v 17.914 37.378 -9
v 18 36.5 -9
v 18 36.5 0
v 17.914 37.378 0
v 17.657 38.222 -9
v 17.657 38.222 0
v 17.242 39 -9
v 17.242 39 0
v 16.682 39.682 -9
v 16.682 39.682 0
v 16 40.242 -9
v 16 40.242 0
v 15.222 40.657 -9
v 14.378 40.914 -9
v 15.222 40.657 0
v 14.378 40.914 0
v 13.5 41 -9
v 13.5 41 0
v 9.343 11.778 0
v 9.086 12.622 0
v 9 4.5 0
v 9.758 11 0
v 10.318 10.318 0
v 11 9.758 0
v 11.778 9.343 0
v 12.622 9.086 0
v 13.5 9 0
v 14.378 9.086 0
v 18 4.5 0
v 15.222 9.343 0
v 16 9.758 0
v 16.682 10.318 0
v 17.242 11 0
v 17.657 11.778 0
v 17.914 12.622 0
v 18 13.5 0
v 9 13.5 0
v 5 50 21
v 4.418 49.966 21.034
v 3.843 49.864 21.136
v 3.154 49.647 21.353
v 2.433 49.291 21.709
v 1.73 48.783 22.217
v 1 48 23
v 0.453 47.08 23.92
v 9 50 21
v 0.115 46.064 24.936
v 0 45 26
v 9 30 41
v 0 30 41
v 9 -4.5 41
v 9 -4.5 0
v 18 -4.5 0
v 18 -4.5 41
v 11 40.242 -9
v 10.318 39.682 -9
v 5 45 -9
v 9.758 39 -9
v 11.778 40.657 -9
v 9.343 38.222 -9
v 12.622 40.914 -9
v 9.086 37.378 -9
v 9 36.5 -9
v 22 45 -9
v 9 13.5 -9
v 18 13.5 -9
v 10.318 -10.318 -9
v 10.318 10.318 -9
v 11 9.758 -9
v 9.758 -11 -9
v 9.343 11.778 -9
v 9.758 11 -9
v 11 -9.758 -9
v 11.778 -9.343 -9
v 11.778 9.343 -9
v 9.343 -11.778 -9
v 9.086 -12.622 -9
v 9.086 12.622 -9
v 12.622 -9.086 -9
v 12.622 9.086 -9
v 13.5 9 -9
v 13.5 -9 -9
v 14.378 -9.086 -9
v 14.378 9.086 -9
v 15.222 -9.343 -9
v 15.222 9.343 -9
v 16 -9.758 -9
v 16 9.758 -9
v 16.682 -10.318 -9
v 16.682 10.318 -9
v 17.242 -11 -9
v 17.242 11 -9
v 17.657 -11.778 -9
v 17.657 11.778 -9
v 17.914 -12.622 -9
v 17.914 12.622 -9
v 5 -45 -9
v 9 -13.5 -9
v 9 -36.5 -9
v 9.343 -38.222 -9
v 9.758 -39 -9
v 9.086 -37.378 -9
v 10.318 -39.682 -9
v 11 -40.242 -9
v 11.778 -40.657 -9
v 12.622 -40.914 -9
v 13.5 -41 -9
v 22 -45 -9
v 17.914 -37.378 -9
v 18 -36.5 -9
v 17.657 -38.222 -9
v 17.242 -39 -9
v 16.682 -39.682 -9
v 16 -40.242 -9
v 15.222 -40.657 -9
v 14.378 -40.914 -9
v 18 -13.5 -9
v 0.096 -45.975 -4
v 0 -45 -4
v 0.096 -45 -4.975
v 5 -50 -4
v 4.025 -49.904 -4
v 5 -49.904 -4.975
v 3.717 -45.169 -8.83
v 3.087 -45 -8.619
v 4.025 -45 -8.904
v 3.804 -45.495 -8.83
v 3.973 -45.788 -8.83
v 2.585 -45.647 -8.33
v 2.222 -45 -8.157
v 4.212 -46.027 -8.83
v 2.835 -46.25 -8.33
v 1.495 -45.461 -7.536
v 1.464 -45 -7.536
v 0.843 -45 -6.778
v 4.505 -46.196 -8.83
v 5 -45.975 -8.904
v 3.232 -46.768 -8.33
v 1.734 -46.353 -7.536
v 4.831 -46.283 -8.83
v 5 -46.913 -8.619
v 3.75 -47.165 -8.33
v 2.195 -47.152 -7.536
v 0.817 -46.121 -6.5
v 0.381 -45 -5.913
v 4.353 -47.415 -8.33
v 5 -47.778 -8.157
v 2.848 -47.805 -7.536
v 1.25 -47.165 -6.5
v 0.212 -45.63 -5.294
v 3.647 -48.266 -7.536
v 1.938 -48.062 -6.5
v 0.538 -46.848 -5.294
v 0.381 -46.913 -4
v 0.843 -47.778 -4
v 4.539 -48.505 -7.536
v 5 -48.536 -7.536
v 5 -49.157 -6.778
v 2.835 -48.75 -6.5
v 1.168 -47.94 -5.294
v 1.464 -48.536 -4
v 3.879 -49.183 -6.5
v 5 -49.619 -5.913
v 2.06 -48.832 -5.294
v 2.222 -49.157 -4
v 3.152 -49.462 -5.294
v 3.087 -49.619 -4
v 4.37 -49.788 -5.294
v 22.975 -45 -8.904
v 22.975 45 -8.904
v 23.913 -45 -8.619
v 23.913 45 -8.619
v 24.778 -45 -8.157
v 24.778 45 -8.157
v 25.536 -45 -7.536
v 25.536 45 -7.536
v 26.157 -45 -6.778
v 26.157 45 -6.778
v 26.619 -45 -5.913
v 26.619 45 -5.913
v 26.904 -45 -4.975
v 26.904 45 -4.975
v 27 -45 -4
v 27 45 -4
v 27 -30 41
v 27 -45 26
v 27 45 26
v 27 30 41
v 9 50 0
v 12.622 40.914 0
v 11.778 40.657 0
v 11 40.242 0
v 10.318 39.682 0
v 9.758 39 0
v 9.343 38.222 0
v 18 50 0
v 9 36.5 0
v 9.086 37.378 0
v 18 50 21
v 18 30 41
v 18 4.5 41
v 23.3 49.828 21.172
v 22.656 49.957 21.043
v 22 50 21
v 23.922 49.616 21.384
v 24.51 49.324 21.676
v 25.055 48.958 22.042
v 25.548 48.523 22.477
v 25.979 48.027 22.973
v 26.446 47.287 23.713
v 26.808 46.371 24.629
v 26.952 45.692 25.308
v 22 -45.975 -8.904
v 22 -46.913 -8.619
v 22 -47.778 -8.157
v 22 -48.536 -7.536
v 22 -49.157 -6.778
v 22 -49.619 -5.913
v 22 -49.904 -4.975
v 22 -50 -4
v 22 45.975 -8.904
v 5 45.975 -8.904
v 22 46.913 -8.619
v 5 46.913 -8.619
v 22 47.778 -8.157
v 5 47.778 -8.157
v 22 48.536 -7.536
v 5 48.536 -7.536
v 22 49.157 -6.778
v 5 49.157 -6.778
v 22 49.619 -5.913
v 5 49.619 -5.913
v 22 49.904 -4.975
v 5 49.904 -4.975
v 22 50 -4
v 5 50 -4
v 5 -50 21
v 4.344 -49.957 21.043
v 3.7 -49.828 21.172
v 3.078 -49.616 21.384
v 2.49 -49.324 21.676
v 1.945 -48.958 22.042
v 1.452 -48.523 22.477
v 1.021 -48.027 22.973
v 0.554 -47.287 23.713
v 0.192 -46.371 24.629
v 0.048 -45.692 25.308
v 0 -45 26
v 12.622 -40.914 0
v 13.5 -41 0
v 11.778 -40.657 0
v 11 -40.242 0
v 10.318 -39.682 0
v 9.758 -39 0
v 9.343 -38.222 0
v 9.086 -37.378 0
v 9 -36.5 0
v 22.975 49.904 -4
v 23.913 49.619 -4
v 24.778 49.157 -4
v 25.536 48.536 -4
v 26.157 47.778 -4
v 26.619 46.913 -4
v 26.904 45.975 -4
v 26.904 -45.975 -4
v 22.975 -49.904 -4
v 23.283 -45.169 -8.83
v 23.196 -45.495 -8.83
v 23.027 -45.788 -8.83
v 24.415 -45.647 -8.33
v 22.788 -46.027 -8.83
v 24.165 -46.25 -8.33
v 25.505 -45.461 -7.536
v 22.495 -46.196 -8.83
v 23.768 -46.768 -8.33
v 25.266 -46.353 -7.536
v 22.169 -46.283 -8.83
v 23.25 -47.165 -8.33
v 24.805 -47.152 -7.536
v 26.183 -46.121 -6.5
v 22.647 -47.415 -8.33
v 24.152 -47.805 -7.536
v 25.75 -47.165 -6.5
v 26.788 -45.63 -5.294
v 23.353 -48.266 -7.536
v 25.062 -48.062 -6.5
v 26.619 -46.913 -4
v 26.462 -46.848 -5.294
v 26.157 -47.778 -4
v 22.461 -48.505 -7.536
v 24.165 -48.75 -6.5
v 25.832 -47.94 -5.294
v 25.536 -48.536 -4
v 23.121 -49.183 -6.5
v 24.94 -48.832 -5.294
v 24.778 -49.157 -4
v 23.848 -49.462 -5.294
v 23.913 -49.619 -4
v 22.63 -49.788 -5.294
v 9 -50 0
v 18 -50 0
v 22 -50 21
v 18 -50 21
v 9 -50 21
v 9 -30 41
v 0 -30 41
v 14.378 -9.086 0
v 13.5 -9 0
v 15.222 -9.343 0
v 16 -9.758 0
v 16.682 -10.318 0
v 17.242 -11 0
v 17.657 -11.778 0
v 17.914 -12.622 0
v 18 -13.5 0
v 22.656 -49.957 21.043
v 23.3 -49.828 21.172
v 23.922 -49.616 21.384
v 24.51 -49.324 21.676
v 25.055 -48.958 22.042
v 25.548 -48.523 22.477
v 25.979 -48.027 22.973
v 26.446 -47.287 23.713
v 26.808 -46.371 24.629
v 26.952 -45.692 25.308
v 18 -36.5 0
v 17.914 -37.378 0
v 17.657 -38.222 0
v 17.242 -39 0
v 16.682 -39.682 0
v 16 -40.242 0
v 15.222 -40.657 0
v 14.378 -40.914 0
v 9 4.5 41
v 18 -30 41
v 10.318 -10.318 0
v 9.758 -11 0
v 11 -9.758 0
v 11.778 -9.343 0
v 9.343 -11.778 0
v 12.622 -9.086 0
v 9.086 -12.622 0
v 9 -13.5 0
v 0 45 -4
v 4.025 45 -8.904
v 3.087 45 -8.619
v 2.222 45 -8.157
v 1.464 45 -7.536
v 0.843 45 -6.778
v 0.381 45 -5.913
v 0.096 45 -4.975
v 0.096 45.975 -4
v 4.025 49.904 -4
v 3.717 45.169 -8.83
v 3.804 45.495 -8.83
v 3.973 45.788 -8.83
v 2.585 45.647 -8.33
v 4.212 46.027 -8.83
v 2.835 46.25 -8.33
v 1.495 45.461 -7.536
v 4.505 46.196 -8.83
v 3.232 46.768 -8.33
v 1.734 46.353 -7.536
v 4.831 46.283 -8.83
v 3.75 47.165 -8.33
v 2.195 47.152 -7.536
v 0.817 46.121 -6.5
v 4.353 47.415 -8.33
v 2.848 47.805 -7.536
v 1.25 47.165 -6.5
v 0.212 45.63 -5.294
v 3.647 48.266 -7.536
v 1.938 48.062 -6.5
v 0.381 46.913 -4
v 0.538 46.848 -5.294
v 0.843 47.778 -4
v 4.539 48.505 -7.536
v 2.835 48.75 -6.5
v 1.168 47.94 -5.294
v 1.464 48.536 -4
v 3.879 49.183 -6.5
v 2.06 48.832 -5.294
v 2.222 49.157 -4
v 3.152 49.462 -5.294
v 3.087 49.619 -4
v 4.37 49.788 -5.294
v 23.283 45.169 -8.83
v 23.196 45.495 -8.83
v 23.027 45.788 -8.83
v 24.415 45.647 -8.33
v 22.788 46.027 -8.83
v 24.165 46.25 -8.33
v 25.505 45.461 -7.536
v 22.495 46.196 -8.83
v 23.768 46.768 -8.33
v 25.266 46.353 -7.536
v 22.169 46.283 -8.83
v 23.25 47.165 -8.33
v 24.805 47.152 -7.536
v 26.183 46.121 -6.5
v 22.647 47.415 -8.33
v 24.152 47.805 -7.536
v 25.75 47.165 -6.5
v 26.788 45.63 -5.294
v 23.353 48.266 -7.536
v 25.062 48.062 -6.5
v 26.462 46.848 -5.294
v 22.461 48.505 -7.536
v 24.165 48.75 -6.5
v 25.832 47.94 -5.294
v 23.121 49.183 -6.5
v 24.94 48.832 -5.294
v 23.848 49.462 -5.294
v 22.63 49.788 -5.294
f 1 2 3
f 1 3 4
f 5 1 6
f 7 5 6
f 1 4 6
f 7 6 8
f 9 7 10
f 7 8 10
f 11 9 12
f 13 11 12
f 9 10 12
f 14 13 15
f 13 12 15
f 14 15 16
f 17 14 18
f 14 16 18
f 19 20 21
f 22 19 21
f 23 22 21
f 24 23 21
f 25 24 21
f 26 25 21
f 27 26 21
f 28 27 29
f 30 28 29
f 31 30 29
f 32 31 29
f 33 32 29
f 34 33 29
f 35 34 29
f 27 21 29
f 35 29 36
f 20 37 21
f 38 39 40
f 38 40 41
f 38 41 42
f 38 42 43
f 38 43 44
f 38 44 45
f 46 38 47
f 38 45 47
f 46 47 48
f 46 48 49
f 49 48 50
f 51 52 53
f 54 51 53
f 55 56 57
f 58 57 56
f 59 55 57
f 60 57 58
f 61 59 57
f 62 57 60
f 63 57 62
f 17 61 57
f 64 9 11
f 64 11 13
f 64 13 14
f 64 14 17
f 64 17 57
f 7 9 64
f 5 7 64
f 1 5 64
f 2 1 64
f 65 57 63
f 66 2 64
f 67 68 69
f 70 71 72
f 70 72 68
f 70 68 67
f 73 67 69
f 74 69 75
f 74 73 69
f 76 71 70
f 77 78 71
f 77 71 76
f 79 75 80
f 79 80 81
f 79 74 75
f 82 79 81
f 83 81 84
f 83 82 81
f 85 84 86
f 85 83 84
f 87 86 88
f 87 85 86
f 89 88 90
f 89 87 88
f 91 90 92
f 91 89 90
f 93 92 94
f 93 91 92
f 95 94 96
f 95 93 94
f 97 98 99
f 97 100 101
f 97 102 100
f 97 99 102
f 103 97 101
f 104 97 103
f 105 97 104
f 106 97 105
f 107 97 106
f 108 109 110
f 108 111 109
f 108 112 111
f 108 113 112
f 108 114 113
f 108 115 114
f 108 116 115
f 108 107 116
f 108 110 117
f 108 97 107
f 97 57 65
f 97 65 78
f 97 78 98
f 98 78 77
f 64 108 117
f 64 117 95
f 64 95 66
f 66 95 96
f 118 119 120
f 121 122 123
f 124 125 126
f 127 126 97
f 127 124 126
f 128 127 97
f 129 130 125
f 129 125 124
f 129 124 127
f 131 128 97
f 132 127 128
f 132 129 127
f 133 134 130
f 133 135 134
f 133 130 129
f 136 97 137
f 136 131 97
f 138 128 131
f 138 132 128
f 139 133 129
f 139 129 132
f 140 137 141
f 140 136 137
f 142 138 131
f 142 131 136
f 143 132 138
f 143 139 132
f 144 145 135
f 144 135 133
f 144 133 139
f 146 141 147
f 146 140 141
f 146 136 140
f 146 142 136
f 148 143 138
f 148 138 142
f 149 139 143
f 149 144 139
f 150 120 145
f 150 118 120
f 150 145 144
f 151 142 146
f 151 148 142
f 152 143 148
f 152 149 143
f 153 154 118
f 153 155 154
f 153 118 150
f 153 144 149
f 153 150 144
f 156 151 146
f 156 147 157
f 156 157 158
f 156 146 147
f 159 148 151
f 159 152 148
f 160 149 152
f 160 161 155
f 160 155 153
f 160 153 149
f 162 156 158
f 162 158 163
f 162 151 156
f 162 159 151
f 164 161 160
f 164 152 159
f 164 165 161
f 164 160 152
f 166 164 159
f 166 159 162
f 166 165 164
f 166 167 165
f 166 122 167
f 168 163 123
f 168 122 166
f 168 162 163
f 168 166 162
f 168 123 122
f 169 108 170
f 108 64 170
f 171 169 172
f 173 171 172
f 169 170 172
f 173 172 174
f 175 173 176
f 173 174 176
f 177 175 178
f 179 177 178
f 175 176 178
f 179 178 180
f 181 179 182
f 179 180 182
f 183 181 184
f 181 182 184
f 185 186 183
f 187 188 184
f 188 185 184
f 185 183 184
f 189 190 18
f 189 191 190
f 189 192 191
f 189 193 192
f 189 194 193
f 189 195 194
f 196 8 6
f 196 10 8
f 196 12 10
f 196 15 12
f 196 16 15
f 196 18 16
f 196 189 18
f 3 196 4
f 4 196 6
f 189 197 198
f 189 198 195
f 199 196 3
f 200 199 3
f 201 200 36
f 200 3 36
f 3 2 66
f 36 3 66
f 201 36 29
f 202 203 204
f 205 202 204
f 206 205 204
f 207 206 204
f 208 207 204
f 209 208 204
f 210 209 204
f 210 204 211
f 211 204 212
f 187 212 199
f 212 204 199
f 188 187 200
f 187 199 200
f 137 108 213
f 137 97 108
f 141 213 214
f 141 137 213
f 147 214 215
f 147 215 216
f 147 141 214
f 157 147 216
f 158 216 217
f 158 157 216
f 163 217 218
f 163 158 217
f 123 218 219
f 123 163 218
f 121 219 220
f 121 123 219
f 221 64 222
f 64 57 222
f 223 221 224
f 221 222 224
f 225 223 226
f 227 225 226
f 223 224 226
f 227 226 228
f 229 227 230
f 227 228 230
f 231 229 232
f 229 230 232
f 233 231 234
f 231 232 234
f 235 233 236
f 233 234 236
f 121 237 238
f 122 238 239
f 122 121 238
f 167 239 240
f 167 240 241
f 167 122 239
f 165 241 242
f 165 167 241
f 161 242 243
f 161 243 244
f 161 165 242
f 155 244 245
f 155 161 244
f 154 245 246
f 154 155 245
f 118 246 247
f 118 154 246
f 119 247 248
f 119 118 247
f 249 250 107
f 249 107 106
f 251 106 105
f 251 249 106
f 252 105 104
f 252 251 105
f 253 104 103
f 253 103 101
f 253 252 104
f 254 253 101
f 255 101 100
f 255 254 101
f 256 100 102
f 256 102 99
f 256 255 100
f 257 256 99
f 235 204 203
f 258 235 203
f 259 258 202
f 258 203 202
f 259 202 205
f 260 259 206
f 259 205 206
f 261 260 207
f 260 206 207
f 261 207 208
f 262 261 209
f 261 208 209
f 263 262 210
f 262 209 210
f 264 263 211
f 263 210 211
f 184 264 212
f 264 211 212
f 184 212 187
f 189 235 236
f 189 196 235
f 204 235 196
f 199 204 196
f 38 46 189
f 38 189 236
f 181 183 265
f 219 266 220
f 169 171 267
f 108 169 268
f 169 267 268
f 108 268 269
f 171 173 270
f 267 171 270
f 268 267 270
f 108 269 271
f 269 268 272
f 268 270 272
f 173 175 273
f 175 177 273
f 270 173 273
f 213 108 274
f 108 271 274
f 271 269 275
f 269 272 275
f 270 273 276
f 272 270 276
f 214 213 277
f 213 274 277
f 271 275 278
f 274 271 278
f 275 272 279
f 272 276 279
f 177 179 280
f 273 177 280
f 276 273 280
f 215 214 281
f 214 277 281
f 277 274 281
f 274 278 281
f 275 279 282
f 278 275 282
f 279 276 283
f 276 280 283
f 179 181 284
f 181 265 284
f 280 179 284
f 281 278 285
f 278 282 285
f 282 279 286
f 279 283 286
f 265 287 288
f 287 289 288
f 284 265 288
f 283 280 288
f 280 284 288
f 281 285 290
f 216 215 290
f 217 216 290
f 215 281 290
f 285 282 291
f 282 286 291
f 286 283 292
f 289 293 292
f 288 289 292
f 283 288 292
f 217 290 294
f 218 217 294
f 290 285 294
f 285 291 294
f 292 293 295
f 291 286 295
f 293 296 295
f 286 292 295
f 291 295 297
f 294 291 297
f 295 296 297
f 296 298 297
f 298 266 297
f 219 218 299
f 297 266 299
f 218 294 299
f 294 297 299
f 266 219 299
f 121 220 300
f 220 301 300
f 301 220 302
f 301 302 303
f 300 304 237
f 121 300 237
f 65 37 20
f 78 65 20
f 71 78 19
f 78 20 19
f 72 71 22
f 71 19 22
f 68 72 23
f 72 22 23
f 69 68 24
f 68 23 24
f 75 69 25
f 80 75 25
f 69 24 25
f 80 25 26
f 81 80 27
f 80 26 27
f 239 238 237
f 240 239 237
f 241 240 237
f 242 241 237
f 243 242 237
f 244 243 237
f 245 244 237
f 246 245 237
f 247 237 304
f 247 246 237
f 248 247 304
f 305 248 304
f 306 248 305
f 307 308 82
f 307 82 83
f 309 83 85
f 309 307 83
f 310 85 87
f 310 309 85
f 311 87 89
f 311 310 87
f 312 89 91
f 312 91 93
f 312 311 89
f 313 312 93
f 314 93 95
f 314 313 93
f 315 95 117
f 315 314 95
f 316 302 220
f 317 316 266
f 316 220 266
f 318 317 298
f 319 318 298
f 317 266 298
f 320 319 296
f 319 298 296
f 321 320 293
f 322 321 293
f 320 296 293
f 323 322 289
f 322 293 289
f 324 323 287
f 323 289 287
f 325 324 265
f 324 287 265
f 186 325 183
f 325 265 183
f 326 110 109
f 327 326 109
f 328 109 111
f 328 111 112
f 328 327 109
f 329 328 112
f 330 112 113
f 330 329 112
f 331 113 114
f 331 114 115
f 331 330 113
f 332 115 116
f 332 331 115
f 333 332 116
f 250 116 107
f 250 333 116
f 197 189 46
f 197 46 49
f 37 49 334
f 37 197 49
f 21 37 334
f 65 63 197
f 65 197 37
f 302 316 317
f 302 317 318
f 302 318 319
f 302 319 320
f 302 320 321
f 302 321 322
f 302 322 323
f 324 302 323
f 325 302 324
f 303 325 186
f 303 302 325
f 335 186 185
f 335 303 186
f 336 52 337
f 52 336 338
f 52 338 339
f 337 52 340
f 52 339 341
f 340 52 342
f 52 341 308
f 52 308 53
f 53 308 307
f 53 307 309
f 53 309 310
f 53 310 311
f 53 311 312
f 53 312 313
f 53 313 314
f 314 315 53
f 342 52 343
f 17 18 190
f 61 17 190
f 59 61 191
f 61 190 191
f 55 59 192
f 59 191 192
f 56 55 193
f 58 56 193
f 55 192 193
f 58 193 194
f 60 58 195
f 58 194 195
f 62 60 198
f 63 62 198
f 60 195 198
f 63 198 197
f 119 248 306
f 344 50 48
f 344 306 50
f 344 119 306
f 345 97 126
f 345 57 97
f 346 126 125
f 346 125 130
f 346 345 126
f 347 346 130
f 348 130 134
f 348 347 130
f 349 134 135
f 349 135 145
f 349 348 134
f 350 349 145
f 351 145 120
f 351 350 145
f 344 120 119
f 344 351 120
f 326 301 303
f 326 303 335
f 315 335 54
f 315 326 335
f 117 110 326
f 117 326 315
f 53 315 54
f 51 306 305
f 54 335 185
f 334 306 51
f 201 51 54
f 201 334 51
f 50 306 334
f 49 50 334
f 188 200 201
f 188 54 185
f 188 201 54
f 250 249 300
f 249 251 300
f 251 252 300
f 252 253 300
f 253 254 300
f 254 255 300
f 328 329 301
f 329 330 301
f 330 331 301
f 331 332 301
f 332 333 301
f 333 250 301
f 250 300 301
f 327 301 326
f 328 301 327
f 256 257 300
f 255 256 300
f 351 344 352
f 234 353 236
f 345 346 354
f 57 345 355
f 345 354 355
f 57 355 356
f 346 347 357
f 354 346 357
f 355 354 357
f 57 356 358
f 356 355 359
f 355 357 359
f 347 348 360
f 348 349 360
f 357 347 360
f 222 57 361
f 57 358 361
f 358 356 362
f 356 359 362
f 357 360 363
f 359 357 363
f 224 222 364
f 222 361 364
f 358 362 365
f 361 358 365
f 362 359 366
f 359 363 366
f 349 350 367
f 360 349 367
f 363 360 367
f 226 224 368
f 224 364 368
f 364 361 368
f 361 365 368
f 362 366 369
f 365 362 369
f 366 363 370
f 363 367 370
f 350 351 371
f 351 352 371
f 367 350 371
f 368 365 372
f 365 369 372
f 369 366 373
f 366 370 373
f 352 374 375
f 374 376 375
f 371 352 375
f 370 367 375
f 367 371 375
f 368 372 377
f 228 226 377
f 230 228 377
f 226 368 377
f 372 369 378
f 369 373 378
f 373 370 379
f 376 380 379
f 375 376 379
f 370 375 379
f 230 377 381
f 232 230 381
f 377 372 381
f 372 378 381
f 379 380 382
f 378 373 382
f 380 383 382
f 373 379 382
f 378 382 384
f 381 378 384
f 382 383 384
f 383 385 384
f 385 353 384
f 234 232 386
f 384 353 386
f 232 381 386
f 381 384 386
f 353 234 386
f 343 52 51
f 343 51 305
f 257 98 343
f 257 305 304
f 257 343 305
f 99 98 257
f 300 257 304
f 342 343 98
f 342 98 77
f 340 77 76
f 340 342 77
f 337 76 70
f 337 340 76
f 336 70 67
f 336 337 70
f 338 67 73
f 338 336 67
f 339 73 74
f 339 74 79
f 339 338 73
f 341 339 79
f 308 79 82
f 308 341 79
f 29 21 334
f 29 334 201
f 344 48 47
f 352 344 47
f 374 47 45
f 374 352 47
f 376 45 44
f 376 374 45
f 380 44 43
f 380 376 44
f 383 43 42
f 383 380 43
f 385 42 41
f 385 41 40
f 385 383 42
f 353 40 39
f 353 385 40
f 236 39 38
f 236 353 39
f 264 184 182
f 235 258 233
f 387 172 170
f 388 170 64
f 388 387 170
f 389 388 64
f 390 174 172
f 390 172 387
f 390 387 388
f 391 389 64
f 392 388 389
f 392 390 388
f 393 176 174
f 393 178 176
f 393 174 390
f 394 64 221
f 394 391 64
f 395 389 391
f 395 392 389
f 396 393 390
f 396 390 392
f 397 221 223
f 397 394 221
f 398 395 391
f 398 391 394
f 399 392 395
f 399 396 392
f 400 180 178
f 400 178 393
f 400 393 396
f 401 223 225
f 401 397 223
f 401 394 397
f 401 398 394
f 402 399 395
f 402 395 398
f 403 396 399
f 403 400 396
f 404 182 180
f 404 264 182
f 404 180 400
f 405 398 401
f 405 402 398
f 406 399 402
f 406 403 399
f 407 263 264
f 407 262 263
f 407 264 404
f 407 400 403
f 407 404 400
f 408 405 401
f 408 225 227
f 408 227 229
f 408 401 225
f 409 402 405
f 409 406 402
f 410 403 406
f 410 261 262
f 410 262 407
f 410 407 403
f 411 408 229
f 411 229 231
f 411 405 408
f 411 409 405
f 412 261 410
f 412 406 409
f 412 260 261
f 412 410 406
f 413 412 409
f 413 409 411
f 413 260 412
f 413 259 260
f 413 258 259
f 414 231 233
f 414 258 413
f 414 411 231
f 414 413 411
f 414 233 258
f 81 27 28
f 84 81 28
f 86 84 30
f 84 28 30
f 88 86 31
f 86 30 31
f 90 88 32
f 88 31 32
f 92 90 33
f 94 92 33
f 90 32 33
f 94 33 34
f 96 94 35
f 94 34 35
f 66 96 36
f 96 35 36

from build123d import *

# Parameters (mm, degrees)
F0_W      = 41
F0_H      = 9
F1_DEPTH  = 41
F3_DEPTH  = 9
F5_DEPTH  = 9
F7_DEPTH  = 30
F9_DEPTH  = 30
F11_DEPTH = 9
F13_DEPTH = 25
F14_R     = 1
F16_W     = 18
F16_H     = 9
F17_DEPTH = 41
F19_DEPTH = 50.001
F20_R     = 5
F21_W     = 9
F21_H     = 41
F22_DEPTH = 30
F23_W     = 27
F23_H     = 9
F24_DEPTH = 41


with BuildPart() as f1:
    # F0 (on Top) → F1 (new body)
    with BuildSketch(Plane.XY):
        Polygon((0, 50), (0, 0), (27, 0), (27, 4.5), (27, 13.5), (27, 22.5), (27, 50), (18, 50), (18, 4.5), (9, 4.5), (9, 50), align=None)
        with Locations((47.5, 9)):
            Rectangle(F0_W, F0_H)
    extrude(amount=F1_DEPTH)

    # F2 (on Top) → F3 (join)
    with BuildSketch(Plane.XY):
        Polygon((0, 50), (0, 0), (68, 0), (68, 13.5), (27, 50), align=None)
    extrude(amount=-F3_DEPTH)

    # F4 (on face) → F5 (cut, through all)
    with BuildSketch(Plane.XY):
        Polygon((56.1775657399, 18), (31.5, 39.9690524269), (31.5, 18), align=None)
    extrude(amount=-F5_DEPTH, mode=Mode.SUBTRACT)

    # F6 (on face) → F7 (cut)
    with BuildSketch(Plane(origin=(0, 0, 0), x_dir=(0, -1, 0), z_dir=(-1, 0, 0))):
        Polygon((-50, 21), (-30, 41), (-50, 41), align=None)
    extrude(amount=-F7_DEPTH, mode=Mode.SUBTRACT)

    # F8 (on face) → F9 (cut)
    with BuildSketch(Plane.XZ):
        Polygon((0, 21), (0, 41), (-20, 41), align=None)
    extrude(amount=-F9_DEPTH, mode=Mode.SUBTRACT)

    # F10 (on face) → F11 (cut, through all)
    with BuildSketch(Plane.XY):
        with BuildLine():
            Line((9, 36.5), (9, 13.5))
            ThreePointArc((9, 13.5), (10.3180194847, 10.3180194847), (13.5, 9))
            ThreePointArc((13.5, 9), (16.6819805153, 10.3180194847), (18, 13.5))
            Line((18, 13.5), (18, 36.5))
            ThreePointArc((18, 36.5), (16.6819805153, 39.6819805153), (13.5, 41))
            ThreePointArc((13.5, 41), (10.3180194847, 39.6819805153), (9, 36.5))
        make_face()
        with BuildLine():
            ThreePointArc((59, 0), (57.6819805153, 3.1819805153), (54.5, 4.5))
            Line((54.5, 4.5), (40.5, 4.5))
            ThreePointArc((40.5, 4.5), (37.3180194847, 3.1819805153), (36, 0))
            Line((36, 0), (59, 0))
        make_face()
    extrude(amount=-F11_DEPTH, mode=Mode.SUBTRACT)

    # F12 (on face) → F13 (cut)
    with BuildSketch(Plane.XZ.offset(-4.5)):
        Polygon((68, 21), (68, 41), (48, 41), align=None)
        Polygon((59, 17.2720779386), (44.2720779386, 32), (36, 32), (36, 9), (59, 9), align=None)
    extrude(amount=-F13_DEPTH, mode=Mode.SUBTRACT)

    # F14
    f14_edges = [f1.edges().sort_by_distance(p)[0] for p in [
        (31.5, 18, -4.5),
        (31.5, 39.969052, -4.5),
        (56.177566, 18, -4.5),
        (36, 9, 9),
        (36, 9, 32),
        (44.272078, 9, 32),
        (59, 9, 17.272078),
        (59, 9, 9),
    ]]
    fillet(f14_edges, radius=F14_R)

    # F15: F1 across face


with BuildPart() as f1_1:
    add(f1.part)
    add(f1.part.mirror(Plane(origin=(14.5188679245, 0, 14.8396226415), x_dir=(1, 0, 0), z_dir=(0, -1, 0))))

    # F16 (on face) → F17 (cut)
    with BuildSketch(Plane.XY.offset(41)):
        with Locations((18, 0)):
            Rectangle(F16_W, F16_H)
    extrude(amount=-F17_DEPTH, mode=Mode.SUBTRACT)

    # F18 (on face) → F19 (cut, through all)
    with BuildSketch(Plane.XY.offset(41)):
        Polygon((27, 70.5021247268), (27, -13.5), (27, -65.4299333692), (95.0682684779, -18.0513188243), (92.9595008492, 35.7407592237), align=None)
    extrude(amount=-F19_DEPTH, mode=Mode.SUBTRACT)

    # F20
    f20_edges = [f1_1.edges().sort_by_distance(p)[0] for p in [
        (27, -50, 6),
        (0, -50, 6),
        (27, 50, 6),
        (0, 50, 6),
        (0, 0, -9),
        (27, 0, -9),
        (13.5, 50, -9),
        (13.5, -50, -9),
    ]]
    fillet(f20_edges, radius=F20_R)

    # F21 (on face) → F22 (cut)
    with BuildSketch(Plane.YZ.offset(27)):
        with Locations((0, 20.5)):
            Rectangle(F21_W, F21_H)
    extrude(amount=-F22_DEPTH, mode=Mode.SUBTRACT)

    # F23 (on face) → F24 (join)
    with BuildSketch(Plane.XY):
        with Locations((13.5, 0)):
            Rectangle(F23_W, F23_H)
    extrude(amount=F24_DEPTH)


solid = f1_1.part
